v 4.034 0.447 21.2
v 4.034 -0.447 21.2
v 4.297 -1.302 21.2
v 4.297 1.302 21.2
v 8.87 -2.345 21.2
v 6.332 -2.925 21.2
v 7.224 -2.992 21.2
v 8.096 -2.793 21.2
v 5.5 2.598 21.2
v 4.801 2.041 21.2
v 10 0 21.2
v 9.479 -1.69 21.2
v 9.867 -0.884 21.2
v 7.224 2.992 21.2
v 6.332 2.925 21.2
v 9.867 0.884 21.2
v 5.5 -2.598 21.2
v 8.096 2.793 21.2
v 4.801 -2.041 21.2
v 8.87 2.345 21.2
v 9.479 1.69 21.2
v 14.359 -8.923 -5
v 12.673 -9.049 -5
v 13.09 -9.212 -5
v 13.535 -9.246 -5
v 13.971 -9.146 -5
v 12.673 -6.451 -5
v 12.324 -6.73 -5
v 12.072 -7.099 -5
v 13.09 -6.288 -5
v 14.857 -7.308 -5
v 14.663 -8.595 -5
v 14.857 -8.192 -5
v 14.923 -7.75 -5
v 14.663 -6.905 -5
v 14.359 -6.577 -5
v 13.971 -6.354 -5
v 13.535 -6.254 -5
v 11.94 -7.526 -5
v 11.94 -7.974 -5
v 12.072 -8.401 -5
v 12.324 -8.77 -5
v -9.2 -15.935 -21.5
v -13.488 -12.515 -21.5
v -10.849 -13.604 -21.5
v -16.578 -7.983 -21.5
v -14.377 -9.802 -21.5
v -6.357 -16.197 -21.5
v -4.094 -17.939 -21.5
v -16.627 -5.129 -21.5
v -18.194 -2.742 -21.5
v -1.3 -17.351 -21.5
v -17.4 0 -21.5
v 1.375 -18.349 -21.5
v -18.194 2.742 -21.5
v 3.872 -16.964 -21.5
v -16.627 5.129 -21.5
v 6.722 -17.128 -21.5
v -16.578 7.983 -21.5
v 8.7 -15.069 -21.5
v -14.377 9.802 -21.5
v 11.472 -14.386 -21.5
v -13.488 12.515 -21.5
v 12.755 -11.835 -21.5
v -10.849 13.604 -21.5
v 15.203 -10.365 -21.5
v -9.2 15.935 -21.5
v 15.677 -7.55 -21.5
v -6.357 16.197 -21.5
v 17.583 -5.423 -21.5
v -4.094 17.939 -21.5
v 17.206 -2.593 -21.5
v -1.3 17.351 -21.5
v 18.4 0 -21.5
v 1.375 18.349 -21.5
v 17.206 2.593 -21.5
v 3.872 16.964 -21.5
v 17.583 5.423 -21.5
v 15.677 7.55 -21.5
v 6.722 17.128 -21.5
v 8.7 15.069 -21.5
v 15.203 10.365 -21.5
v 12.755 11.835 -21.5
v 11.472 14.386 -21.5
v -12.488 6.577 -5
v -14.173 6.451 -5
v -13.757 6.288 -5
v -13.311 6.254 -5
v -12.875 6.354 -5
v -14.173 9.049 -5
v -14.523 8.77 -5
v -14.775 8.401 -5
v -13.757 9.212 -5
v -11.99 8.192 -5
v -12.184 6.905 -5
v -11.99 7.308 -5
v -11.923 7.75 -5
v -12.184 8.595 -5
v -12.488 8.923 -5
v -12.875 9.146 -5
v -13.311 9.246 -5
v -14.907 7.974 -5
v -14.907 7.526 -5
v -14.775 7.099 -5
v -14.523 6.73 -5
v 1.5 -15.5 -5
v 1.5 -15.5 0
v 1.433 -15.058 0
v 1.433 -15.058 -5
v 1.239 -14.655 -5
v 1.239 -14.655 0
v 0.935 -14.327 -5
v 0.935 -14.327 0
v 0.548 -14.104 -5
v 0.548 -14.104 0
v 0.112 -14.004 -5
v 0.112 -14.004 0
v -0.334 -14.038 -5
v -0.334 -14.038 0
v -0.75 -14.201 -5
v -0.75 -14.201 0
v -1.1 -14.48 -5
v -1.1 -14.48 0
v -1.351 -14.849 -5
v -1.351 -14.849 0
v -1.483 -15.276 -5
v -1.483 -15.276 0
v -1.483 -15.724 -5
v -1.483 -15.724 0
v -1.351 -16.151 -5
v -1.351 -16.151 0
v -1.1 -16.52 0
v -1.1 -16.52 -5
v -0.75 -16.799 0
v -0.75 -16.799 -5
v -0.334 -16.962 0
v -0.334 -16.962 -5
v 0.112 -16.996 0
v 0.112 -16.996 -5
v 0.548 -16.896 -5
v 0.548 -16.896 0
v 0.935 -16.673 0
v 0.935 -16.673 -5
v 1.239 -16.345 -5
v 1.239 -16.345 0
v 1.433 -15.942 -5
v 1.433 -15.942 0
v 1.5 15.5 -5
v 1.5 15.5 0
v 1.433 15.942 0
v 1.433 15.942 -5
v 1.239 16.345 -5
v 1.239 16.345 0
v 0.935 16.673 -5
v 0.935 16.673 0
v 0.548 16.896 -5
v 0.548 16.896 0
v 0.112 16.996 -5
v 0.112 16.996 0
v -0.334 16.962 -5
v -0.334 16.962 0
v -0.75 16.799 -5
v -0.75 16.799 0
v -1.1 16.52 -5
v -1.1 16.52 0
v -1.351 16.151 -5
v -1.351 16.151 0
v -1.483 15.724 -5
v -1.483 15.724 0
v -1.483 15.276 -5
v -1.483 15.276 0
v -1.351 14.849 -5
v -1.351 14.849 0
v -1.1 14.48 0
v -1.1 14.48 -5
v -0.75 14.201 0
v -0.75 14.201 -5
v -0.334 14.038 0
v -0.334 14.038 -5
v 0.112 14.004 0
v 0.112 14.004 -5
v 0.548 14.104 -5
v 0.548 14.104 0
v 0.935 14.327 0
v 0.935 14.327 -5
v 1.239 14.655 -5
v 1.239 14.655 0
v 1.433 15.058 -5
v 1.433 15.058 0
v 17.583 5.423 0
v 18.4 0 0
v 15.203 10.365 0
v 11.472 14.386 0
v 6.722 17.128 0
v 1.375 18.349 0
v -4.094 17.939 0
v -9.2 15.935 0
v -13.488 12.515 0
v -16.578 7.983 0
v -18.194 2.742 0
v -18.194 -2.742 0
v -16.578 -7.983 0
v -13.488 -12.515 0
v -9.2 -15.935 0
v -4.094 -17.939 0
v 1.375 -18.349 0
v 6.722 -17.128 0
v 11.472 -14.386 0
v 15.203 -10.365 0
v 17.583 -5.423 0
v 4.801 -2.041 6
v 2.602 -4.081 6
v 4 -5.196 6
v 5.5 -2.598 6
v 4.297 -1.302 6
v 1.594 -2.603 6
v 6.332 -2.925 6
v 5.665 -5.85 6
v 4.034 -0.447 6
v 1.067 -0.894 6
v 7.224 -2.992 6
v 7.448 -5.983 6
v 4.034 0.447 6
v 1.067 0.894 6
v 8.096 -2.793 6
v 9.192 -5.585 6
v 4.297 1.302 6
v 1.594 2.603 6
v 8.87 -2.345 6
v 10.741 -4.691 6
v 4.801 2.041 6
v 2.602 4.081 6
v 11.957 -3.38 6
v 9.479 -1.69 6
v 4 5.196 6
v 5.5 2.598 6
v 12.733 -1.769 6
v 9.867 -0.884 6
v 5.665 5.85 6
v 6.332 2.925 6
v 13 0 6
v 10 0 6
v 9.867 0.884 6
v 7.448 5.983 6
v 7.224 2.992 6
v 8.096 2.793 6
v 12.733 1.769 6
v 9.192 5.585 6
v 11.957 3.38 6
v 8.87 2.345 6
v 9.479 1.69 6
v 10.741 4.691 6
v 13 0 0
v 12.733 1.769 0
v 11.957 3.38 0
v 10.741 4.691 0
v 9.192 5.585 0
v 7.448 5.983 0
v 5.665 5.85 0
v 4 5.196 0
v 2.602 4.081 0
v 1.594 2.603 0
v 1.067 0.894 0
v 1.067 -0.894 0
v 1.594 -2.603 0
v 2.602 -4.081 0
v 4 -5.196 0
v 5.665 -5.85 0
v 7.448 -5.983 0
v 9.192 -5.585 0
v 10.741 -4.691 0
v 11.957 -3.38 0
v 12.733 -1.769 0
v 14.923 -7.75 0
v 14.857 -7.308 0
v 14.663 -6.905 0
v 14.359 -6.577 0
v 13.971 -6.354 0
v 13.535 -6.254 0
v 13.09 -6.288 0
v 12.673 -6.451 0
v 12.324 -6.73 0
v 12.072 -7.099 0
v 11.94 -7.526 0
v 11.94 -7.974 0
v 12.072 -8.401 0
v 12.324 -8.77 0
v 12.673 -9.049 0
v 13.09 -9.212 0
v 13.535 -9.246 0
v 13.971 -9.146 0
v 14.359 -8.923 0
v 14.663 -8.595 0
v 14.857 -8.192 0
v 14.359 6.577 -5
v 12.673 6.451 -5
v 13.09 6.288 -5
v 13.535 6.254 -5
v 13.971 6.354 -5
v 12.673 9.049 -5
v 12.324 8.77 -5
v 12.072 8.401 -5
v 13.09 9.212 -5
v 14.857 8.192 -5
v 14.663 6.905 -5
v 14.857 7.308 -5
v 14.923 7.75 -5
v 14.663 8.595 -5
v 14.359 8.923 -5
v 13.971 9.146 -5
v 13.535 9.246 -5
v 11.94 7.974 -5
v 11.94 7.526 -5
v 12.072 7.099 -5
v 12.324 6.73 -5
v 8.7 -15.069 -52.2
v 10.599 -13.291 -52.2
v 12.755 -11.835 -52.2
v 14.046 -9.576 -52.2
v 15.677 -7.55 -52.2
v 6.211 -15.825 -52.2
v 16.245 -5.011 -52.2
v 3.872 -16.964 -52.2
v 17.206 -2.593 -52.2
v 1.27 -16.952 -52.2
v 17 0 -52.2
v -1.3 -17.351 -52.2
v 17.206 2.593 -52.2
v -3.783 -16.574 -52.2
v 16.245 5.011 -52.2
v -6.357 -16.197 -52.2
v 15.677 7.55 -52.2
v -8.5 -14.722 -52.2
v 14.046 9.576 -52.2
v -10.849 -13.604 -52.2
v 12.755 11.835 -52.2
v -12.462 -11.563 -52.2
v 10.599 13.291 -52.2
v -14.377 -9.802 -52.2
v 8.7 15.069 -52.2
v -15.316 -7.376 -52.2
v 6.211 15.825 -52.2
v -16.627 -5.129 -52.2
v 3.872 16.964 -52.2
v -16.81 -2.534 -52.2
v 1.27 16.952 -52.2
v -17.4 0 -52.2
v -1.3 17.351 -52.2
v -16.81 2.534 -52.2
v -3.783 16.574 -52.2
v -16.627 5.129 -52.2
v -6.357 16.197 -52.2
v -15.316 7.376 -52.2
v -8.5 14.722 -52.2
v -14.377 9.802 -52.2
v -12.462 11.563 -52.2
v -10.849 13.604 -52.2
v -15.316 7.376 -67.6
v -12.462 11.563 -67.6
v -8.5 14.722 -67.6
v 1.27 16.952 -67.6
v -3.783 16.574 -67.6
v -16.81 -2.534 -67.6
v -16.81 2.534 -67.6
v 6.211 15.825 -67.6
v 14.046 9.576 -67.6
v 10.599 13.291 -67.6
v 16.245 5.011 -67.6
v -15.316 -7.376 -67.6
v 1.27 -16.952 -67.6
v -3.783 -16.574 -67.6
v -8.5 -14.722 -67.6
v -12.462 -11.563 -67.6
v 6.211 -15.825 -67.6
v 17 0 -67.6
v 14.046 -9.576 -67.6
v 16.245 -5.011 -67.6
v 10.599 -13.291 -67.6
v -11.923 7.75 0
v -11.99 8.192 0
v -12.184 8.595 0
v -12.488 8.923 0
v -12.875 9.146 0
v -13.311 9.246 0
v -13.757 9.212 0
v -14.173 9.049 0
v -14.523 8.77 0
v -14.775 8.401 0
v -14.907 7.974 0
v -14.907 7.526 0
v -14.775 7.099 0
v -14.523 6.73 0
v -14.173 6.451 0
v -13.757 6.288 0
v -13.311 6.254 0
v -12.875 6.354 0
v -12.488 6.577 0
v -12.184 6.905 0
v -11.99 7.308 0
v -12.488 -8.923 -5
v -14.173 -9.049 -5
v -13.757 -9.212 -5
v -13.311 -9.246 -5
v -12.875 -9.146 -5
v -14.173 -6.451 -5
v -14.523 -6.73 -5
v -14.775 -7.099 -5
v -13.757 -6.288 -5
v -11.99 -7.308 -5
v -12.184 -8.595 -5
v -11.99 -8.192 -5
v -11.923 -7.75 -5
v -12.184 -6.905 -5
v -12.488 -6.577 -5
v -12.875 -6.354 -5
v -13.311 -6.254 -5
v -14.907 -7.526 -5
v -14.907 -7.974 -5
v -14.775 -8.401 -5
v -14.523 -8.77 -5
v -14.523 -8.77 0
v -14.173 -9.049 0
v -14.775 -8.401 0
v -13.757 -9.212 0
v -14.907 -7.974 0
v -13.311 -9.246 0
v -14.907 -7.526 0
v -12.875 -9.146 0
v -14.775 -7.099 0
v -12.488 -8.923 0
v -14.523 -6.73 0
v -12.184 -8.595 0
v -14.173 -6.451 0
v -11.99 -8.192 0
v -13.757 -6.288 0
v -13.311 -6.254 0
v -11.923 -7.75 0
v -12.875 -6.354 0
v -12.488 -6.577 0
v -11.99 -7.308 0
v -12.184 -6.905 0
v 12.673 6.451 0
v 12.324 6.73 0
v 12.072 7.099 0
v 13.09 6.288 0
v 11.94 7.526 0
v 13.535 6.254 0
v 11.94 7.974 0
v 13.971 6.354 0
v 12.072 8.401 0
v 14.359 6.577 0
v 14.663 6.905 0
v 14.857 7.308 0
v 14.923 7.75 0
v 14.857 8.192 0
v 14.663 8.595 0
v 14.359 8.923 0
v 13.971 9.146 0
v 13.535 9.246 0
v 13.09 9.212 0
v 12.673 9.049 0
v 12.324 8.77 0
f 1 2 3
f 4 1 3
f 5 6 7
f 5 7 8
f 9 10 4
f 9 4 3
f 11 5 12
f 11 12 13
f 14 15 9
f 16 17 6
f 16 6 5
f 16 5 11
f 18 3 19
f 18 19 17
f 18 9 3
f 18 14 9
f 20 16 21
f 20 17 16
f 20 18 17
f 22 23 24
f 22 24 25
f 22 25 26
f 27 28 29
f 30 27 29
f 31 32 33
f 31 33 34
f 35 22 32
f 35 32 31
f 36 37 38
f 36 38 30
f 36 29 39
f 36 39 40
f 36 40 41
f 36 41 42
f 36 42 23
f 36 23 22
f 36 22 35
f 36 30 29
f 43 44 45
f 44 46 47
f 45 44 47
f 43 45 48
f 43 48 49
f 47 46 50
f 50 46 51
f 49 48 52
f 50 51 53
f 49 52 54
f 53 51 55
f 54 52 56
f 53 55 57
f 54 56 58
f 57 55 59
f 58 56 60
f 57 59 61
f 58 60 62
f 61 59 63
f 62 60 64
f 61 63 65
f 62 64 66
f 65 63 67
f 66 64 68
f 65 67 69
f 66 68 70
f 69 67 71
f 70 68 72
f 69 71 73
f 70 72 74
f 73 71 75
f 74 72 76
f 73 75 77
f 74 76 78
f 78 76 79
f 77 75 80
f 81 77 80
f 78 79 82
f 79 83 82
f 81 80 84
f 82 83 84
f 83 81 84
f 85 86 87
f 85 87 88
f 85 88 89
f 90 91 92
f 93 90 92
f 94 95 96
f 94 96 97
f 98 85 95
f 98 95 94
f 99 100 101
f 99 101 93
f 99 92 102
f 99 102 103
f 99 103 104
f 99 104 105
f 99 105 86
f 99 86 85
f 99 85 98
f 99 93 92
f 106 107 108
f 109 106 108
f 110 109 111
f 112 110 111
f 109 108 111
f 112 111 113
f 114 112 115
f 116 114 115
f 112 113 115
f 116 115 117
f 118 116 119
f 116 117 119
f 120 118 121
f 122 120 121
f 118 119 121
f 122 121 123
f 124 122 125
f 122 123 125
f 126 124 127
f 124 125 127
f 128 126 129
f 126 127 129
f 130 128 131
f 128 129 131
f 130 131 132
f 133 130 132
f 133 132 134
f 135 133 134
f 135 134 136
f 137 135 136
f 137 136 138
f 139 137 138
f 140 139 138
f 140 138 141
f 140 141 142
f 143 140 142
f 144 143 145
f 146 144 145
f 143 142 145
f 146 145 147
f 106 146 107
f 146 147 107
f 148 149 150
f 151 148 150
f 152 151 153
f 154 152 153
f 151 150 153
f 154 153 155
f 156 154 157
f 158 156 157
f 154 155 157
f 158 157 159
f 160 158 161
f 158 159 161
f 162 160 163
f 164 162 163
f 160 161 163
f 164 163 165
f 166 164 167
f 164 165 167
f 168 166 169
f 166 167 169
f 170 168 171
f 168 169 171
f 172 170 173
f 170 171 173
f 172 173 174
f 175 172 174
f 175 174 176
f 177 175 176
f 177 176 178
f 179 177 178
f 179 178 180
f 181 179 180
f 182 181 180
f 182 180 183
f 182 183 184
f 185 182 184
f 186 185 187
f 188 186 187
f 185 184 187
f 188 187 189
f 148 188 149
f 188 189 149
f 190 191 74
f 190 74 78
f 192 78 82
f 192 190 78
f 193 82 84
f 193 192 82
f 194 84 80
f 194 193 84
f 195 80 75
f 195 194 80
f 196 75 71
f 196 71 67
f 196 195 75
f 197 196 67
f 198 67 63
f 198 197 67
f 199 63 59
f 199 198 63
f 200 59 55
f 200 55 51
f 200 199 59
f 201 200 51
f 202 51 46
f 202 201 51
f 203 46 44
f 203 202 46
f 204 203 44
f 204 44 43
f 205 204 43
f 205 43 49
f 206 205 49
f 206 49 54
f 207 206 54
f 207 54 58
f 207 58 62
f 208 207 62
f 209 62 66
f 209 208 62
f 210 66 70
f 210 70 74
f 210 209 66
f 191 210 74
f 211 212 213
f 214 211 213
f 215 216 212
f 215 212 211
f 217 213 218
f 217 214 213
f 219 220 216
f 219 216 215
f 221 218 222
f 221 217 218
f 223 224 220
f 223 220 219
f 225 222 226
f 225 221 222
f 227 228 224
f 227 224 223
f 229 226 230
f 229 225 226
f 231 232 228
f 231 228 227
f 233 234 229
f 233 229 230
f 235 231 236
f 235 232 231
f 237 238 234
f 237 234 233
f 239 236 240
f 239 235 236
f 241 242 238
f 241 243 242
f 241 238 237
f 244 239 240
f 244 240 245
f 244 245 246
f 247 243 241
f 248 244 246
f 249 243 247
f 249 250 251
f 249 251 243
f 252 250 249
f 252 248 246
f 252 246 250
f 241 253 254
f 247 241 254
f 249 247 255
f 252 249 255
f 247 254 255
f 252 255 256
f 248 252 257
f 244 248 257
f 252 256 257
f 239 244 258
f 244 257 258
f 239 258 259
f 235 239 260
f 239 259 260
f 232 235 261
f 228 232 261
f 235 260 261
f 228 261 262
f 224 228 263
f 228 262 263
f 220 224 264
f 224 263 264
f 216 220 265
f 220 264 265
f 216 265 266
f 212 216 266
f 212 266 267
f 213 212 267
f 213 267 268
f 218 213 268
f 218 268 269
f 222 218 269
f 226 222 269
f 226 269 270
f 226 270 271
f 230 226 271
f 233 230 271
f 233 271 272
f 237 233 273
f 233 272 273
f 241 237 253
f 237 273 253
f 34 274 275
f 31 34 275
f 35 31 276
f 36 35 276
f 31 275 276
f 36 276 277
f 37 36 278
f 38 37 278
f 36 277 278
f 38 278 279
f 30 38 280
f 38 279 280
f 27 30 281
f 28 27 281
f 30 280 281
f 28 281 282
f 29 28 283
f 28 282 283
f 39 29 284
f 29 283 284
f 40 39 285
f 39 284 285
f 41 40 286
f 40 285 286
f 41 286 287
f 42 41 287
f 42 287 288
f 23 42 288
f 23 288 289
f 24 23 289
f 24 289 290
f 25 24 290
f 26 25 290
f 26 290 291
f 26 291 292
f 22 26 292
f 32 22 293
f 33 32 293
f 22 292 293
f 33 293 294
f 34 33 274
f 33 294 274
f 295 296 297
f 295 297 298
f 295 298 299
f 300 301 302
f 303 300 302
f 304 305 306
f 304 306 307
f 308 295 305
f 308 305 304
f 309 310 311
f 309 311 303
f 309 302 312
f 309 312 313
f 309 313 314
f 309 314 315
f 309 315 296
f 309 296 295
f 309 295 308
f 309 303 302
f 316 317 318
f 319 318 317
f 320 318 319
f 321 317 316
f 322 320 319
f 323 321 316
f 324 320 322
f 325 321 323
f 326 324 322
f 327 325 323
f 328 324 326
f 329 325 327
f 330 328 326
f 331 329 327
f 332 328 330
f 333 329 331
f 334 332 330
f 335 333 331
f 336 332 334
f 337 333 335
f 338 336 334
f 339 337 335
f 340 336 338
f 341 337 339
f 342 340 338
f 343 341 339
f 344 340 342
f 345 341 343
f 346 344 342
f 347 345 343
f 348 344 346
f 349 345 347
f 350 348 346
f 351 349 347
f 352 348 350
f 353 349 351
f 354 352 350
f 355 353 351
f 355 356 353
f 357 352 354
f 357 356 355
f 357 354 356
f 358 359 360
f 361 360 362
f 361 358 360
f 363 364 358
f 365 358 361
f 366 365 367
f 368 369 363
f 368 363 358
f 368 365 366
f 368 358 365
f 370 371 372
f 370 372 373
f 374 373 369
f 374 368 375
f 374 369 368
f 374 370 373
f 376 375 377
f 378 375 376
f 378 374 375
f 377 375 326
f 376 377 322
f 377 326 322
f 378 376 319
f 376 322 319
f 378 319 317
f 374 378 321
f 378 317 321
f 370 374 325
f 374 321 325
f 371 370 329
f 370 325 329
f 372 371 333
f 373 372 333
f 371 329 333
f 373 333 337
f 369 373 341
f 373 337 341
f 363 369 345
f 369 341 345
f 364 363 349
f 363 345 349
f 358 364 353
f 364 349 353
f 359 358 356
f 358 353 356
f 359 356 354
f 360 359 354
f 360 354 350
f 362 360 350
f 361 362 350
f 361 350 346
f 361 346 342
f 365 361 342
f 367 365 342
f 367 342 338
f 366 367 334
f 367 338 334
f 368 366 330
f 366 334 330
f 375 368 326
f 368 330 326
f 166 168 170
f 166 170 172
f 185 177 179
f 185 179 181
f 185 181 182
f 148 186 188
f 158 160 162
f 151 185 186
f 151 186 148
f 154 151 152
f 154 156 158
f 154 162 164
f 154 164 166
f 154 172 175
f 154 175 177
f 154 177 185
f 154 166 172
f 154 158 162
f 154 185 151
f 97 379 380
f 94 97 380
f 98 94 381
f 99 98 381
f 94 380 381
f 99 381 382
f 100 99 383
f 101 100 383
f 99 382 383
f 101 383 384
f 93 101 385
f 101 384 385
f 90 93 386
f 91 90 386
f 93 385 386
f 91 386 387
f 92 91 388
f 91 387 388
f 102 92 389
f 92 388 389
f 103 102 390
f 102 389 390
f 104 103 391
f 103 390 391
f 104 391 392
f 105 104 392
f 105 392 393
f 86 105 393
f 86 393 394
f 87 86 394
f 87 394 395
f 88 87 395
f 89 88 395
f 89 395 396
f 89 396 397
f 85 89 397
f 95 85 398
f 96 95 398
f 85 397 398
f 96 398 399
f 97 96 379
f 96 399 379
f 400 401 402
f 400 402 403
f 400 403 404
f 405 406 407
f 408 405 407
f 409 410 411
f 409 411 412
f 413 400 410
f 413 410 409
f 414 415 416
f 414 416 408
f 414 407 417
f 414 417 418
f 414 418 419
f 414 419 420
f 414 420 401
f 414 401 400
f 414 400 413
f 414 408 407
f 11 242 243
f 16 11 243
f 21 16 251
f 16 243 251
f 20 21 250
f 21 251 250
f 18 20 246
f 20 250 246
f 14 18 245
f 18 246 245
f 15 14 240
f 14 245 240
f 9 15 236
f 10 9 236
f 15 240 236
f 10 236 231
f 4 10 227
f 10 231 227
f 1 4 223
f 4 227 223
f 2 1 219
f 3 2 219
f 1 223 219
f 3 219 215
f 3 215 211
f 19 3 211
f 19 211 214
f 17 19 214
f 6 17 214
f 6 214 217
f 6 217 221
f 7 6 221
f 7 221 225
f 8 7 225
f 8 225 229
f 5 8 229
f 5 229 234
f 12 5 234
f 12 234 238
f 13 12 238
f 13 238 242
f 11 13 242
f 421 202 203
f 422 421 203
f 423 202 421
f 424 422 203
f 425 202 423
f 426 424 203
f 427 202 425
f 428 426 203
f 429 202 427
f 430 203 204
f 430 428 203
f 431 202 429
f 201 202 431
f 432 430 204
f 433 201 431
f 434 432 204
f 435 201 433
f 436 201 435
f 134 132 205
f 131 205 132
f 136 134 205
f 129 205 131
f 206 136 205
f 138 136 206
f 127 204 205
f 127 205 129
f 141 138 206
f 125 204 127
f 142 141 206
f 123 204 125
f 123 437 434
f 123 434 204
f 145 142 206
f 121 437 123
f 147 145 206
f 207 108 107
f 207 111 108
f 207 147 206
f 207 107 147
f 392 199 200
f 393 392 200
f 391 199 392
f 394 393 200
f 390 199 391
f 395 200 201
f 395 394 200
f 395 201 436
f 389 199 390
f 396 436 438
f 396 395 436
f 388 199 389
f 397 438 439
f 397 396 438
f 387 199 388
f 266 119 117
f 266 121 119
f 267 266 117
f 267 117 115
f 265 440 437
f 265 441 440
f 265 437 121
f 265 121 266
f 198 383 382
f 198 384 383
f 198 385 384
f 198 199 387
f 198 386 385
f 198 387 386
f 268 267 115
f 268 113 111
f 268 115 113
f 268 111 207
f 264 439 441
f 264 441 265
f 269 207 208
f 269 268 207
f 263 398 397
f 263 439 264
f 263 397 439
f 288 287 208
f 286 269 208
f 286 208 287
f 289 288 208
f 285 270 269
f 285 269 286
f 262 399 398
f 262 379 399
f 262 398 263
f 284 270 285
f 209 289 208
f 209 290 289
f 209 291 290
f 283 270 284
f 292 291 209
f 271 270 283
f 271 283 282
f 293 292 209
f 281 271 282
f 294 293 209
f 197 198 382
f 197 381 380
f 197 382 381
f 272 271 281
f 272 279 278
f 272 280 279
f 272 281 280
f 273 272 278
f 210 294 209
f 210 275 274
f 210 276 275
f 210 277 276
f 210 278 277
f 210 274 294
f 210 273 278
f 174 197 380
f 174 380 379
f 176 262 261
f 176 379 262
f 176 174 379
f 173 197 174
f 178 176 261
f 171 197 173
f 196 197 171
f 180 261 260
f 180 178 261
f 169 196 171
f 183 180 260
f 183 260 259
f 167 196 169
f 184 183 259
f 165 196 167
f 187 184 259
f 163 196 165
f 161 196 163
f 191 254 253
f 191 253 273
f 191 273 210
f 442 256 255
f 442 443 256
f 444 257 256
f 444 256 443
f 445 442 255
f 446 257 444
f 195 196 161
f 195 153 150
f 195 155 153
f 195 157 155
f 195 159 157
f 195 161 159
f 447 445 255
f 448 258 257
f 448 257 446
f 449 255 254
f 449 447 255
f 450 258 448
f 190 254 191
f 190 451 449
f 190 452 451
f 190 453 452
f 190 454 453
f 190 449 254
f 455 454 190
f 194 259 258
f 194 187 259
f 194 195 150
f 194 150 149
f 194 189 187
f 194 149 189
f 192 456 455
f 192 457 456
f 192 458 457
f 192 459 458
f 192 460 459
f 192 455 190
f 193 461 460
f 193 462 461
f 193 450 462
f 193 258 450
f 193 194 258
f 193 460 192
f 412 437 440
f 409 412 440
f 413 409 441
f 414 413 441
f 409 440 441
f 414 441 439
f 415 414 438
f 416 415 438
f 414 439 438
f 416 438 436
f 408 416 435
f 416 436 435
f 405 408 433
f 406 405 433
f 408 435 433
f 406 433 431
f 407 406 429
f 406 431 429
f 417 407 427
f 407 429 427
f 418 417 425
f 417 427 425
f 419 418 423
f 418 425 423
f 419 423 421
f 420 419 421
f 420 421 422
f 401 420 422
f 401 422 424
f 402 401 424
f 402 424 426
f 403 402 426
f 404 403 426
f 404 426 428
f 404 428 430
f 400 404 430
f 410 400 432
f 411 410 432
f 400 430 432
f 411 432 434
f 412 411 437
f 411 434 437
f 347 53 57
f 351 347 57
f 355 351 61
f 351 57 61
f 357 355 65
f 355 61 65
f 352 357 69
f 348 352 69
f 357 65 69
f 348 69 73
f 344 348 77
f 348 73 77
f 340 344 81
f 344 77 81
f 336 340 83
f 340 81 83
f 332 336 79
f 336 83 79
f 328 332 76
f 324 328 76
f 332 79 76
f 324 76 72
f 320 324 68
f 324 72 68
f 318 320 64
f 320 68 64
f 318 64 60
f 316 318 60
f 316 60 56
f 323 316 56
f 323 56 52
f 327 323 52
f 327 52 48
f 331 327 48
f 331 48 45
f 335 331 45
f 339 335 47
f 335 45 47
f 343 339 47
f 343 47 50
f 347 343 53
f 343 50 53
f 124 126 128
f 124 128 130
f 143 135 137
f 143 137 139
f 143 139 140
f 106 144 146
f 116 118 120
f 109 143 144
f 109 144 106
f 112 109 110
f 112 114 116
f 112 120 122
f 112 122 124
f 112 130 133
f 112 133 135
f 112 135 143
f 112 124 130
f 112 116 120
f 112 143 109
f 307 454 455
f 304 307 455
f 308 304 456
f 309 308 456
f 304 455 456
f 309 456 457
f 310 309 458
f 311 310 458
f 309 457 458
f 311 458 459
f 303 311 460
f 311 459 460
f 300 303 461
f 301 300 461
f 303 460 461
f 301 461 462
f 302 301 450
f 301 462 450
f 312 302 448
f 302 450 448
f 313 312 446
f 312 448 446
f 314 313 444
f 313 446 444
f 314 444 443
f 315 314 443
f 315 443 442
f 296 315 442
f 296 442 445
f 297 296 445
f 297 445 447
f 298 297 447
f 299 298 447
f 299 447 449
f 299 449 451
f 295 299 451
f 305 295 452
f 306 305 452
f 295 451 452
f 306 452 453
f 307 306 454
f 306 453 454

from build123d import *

# Parameters (mm, degrees)
SKETCH_1_R          = 18.4
EXTRUDE_1_DEPTH     = 21.5
SKETCH_1_3_R        = 6
EXTRUDE_2_DEPTH     = 6
SKETCH_1_4_R        = 3
EXTRUDE_3_DEPTH     = 21.2
SKETCH_2_R          = 17.4
EXTRUDE_4_DEPTH     = 30.7
EXTRUDE_START       = 30.7
SKETCH_2_3_R        = 17
EXTRUDE_5_DEPTH     = 15.4
SKETCH_1_5_R        = 1.5
CUT_EXTRUDE_1_DEPTH = 5


with BuildPart() as part:
    # 스케치1 → 보스-돌출1 (new body)
    with BuildSketch(Plane.XY):
        Circle(SKETCH_1_R)
    extrude(amount=-EXTRUDE_1_DEPTH)

    # 스케치1<3> → 보스-돌출2 (add)
    with BuildSketch(Plane.XY):
        with Locations((7, 0)):
            Circle(SKETCH_1_3_R)
    extrude(amount=EXTRUDE_2_DEPTH)

    # 스케치1<4> → 보스-돌출3 (add)
    with BuildSketch(Plane.XY):
        with Locations((7, 0)):
            Circle(SKETCH_1_4_R)
    extrude(amount=EXTRUDE_3_DEPTH)

    # 스케치2 → 보스-돌출4 (add)
    with BuildSketch(Plane(origin=(0, 0, -21.5), x_dir=(-1, 0, 0), z_dir=(0, 0, -1))):
        Circle(SKETCH_2_R)
    extrude(amount=EXTRUDE_4_DEPTH)

    # 스케치2<3> → 보스-돌출5 (add)
    with BuildSketch(Plane(origin=(0, 0, -21.5), x_dir=(-1, 0, 0), z_dir=(0, 0, -1)).offset(EXTRUDE_START)):
        with Locations(Location((0, 0, 0), (0, 0, 180))):
            Circle(SKETCH_2_3_R)
    extrude(amount=EXTRUDE_5_DEPTH)

    # 스케치1<5> → 컷-돌출1 (cut)
    with BuildSketch(Plane.XY):
        with Locations((-13.423393759, -7.75)):
            Circle(SKETCH_1_5_R)
        with Locations((-13.423393759, 7.75)):
            Circle(SKETCH_1_5_R)
        with Locations((0, 15.5)):
            Circle(SKETCH_1_5_R)
        with Locations((13.423393759, 7.75)):
            Circle(SKETCH_1_5_R)
        with Locations((13.423393759, -7.75)):
            Circle(SKETCH_1_5_R)
        with Locations((0, -15.5)):
            Circle(SKETCH_1_5_R)
    extrude(amount=-CUT_EXTRUDE_1_DEPTH, mode=Mode.SUBTRACT)


solid = part.part
